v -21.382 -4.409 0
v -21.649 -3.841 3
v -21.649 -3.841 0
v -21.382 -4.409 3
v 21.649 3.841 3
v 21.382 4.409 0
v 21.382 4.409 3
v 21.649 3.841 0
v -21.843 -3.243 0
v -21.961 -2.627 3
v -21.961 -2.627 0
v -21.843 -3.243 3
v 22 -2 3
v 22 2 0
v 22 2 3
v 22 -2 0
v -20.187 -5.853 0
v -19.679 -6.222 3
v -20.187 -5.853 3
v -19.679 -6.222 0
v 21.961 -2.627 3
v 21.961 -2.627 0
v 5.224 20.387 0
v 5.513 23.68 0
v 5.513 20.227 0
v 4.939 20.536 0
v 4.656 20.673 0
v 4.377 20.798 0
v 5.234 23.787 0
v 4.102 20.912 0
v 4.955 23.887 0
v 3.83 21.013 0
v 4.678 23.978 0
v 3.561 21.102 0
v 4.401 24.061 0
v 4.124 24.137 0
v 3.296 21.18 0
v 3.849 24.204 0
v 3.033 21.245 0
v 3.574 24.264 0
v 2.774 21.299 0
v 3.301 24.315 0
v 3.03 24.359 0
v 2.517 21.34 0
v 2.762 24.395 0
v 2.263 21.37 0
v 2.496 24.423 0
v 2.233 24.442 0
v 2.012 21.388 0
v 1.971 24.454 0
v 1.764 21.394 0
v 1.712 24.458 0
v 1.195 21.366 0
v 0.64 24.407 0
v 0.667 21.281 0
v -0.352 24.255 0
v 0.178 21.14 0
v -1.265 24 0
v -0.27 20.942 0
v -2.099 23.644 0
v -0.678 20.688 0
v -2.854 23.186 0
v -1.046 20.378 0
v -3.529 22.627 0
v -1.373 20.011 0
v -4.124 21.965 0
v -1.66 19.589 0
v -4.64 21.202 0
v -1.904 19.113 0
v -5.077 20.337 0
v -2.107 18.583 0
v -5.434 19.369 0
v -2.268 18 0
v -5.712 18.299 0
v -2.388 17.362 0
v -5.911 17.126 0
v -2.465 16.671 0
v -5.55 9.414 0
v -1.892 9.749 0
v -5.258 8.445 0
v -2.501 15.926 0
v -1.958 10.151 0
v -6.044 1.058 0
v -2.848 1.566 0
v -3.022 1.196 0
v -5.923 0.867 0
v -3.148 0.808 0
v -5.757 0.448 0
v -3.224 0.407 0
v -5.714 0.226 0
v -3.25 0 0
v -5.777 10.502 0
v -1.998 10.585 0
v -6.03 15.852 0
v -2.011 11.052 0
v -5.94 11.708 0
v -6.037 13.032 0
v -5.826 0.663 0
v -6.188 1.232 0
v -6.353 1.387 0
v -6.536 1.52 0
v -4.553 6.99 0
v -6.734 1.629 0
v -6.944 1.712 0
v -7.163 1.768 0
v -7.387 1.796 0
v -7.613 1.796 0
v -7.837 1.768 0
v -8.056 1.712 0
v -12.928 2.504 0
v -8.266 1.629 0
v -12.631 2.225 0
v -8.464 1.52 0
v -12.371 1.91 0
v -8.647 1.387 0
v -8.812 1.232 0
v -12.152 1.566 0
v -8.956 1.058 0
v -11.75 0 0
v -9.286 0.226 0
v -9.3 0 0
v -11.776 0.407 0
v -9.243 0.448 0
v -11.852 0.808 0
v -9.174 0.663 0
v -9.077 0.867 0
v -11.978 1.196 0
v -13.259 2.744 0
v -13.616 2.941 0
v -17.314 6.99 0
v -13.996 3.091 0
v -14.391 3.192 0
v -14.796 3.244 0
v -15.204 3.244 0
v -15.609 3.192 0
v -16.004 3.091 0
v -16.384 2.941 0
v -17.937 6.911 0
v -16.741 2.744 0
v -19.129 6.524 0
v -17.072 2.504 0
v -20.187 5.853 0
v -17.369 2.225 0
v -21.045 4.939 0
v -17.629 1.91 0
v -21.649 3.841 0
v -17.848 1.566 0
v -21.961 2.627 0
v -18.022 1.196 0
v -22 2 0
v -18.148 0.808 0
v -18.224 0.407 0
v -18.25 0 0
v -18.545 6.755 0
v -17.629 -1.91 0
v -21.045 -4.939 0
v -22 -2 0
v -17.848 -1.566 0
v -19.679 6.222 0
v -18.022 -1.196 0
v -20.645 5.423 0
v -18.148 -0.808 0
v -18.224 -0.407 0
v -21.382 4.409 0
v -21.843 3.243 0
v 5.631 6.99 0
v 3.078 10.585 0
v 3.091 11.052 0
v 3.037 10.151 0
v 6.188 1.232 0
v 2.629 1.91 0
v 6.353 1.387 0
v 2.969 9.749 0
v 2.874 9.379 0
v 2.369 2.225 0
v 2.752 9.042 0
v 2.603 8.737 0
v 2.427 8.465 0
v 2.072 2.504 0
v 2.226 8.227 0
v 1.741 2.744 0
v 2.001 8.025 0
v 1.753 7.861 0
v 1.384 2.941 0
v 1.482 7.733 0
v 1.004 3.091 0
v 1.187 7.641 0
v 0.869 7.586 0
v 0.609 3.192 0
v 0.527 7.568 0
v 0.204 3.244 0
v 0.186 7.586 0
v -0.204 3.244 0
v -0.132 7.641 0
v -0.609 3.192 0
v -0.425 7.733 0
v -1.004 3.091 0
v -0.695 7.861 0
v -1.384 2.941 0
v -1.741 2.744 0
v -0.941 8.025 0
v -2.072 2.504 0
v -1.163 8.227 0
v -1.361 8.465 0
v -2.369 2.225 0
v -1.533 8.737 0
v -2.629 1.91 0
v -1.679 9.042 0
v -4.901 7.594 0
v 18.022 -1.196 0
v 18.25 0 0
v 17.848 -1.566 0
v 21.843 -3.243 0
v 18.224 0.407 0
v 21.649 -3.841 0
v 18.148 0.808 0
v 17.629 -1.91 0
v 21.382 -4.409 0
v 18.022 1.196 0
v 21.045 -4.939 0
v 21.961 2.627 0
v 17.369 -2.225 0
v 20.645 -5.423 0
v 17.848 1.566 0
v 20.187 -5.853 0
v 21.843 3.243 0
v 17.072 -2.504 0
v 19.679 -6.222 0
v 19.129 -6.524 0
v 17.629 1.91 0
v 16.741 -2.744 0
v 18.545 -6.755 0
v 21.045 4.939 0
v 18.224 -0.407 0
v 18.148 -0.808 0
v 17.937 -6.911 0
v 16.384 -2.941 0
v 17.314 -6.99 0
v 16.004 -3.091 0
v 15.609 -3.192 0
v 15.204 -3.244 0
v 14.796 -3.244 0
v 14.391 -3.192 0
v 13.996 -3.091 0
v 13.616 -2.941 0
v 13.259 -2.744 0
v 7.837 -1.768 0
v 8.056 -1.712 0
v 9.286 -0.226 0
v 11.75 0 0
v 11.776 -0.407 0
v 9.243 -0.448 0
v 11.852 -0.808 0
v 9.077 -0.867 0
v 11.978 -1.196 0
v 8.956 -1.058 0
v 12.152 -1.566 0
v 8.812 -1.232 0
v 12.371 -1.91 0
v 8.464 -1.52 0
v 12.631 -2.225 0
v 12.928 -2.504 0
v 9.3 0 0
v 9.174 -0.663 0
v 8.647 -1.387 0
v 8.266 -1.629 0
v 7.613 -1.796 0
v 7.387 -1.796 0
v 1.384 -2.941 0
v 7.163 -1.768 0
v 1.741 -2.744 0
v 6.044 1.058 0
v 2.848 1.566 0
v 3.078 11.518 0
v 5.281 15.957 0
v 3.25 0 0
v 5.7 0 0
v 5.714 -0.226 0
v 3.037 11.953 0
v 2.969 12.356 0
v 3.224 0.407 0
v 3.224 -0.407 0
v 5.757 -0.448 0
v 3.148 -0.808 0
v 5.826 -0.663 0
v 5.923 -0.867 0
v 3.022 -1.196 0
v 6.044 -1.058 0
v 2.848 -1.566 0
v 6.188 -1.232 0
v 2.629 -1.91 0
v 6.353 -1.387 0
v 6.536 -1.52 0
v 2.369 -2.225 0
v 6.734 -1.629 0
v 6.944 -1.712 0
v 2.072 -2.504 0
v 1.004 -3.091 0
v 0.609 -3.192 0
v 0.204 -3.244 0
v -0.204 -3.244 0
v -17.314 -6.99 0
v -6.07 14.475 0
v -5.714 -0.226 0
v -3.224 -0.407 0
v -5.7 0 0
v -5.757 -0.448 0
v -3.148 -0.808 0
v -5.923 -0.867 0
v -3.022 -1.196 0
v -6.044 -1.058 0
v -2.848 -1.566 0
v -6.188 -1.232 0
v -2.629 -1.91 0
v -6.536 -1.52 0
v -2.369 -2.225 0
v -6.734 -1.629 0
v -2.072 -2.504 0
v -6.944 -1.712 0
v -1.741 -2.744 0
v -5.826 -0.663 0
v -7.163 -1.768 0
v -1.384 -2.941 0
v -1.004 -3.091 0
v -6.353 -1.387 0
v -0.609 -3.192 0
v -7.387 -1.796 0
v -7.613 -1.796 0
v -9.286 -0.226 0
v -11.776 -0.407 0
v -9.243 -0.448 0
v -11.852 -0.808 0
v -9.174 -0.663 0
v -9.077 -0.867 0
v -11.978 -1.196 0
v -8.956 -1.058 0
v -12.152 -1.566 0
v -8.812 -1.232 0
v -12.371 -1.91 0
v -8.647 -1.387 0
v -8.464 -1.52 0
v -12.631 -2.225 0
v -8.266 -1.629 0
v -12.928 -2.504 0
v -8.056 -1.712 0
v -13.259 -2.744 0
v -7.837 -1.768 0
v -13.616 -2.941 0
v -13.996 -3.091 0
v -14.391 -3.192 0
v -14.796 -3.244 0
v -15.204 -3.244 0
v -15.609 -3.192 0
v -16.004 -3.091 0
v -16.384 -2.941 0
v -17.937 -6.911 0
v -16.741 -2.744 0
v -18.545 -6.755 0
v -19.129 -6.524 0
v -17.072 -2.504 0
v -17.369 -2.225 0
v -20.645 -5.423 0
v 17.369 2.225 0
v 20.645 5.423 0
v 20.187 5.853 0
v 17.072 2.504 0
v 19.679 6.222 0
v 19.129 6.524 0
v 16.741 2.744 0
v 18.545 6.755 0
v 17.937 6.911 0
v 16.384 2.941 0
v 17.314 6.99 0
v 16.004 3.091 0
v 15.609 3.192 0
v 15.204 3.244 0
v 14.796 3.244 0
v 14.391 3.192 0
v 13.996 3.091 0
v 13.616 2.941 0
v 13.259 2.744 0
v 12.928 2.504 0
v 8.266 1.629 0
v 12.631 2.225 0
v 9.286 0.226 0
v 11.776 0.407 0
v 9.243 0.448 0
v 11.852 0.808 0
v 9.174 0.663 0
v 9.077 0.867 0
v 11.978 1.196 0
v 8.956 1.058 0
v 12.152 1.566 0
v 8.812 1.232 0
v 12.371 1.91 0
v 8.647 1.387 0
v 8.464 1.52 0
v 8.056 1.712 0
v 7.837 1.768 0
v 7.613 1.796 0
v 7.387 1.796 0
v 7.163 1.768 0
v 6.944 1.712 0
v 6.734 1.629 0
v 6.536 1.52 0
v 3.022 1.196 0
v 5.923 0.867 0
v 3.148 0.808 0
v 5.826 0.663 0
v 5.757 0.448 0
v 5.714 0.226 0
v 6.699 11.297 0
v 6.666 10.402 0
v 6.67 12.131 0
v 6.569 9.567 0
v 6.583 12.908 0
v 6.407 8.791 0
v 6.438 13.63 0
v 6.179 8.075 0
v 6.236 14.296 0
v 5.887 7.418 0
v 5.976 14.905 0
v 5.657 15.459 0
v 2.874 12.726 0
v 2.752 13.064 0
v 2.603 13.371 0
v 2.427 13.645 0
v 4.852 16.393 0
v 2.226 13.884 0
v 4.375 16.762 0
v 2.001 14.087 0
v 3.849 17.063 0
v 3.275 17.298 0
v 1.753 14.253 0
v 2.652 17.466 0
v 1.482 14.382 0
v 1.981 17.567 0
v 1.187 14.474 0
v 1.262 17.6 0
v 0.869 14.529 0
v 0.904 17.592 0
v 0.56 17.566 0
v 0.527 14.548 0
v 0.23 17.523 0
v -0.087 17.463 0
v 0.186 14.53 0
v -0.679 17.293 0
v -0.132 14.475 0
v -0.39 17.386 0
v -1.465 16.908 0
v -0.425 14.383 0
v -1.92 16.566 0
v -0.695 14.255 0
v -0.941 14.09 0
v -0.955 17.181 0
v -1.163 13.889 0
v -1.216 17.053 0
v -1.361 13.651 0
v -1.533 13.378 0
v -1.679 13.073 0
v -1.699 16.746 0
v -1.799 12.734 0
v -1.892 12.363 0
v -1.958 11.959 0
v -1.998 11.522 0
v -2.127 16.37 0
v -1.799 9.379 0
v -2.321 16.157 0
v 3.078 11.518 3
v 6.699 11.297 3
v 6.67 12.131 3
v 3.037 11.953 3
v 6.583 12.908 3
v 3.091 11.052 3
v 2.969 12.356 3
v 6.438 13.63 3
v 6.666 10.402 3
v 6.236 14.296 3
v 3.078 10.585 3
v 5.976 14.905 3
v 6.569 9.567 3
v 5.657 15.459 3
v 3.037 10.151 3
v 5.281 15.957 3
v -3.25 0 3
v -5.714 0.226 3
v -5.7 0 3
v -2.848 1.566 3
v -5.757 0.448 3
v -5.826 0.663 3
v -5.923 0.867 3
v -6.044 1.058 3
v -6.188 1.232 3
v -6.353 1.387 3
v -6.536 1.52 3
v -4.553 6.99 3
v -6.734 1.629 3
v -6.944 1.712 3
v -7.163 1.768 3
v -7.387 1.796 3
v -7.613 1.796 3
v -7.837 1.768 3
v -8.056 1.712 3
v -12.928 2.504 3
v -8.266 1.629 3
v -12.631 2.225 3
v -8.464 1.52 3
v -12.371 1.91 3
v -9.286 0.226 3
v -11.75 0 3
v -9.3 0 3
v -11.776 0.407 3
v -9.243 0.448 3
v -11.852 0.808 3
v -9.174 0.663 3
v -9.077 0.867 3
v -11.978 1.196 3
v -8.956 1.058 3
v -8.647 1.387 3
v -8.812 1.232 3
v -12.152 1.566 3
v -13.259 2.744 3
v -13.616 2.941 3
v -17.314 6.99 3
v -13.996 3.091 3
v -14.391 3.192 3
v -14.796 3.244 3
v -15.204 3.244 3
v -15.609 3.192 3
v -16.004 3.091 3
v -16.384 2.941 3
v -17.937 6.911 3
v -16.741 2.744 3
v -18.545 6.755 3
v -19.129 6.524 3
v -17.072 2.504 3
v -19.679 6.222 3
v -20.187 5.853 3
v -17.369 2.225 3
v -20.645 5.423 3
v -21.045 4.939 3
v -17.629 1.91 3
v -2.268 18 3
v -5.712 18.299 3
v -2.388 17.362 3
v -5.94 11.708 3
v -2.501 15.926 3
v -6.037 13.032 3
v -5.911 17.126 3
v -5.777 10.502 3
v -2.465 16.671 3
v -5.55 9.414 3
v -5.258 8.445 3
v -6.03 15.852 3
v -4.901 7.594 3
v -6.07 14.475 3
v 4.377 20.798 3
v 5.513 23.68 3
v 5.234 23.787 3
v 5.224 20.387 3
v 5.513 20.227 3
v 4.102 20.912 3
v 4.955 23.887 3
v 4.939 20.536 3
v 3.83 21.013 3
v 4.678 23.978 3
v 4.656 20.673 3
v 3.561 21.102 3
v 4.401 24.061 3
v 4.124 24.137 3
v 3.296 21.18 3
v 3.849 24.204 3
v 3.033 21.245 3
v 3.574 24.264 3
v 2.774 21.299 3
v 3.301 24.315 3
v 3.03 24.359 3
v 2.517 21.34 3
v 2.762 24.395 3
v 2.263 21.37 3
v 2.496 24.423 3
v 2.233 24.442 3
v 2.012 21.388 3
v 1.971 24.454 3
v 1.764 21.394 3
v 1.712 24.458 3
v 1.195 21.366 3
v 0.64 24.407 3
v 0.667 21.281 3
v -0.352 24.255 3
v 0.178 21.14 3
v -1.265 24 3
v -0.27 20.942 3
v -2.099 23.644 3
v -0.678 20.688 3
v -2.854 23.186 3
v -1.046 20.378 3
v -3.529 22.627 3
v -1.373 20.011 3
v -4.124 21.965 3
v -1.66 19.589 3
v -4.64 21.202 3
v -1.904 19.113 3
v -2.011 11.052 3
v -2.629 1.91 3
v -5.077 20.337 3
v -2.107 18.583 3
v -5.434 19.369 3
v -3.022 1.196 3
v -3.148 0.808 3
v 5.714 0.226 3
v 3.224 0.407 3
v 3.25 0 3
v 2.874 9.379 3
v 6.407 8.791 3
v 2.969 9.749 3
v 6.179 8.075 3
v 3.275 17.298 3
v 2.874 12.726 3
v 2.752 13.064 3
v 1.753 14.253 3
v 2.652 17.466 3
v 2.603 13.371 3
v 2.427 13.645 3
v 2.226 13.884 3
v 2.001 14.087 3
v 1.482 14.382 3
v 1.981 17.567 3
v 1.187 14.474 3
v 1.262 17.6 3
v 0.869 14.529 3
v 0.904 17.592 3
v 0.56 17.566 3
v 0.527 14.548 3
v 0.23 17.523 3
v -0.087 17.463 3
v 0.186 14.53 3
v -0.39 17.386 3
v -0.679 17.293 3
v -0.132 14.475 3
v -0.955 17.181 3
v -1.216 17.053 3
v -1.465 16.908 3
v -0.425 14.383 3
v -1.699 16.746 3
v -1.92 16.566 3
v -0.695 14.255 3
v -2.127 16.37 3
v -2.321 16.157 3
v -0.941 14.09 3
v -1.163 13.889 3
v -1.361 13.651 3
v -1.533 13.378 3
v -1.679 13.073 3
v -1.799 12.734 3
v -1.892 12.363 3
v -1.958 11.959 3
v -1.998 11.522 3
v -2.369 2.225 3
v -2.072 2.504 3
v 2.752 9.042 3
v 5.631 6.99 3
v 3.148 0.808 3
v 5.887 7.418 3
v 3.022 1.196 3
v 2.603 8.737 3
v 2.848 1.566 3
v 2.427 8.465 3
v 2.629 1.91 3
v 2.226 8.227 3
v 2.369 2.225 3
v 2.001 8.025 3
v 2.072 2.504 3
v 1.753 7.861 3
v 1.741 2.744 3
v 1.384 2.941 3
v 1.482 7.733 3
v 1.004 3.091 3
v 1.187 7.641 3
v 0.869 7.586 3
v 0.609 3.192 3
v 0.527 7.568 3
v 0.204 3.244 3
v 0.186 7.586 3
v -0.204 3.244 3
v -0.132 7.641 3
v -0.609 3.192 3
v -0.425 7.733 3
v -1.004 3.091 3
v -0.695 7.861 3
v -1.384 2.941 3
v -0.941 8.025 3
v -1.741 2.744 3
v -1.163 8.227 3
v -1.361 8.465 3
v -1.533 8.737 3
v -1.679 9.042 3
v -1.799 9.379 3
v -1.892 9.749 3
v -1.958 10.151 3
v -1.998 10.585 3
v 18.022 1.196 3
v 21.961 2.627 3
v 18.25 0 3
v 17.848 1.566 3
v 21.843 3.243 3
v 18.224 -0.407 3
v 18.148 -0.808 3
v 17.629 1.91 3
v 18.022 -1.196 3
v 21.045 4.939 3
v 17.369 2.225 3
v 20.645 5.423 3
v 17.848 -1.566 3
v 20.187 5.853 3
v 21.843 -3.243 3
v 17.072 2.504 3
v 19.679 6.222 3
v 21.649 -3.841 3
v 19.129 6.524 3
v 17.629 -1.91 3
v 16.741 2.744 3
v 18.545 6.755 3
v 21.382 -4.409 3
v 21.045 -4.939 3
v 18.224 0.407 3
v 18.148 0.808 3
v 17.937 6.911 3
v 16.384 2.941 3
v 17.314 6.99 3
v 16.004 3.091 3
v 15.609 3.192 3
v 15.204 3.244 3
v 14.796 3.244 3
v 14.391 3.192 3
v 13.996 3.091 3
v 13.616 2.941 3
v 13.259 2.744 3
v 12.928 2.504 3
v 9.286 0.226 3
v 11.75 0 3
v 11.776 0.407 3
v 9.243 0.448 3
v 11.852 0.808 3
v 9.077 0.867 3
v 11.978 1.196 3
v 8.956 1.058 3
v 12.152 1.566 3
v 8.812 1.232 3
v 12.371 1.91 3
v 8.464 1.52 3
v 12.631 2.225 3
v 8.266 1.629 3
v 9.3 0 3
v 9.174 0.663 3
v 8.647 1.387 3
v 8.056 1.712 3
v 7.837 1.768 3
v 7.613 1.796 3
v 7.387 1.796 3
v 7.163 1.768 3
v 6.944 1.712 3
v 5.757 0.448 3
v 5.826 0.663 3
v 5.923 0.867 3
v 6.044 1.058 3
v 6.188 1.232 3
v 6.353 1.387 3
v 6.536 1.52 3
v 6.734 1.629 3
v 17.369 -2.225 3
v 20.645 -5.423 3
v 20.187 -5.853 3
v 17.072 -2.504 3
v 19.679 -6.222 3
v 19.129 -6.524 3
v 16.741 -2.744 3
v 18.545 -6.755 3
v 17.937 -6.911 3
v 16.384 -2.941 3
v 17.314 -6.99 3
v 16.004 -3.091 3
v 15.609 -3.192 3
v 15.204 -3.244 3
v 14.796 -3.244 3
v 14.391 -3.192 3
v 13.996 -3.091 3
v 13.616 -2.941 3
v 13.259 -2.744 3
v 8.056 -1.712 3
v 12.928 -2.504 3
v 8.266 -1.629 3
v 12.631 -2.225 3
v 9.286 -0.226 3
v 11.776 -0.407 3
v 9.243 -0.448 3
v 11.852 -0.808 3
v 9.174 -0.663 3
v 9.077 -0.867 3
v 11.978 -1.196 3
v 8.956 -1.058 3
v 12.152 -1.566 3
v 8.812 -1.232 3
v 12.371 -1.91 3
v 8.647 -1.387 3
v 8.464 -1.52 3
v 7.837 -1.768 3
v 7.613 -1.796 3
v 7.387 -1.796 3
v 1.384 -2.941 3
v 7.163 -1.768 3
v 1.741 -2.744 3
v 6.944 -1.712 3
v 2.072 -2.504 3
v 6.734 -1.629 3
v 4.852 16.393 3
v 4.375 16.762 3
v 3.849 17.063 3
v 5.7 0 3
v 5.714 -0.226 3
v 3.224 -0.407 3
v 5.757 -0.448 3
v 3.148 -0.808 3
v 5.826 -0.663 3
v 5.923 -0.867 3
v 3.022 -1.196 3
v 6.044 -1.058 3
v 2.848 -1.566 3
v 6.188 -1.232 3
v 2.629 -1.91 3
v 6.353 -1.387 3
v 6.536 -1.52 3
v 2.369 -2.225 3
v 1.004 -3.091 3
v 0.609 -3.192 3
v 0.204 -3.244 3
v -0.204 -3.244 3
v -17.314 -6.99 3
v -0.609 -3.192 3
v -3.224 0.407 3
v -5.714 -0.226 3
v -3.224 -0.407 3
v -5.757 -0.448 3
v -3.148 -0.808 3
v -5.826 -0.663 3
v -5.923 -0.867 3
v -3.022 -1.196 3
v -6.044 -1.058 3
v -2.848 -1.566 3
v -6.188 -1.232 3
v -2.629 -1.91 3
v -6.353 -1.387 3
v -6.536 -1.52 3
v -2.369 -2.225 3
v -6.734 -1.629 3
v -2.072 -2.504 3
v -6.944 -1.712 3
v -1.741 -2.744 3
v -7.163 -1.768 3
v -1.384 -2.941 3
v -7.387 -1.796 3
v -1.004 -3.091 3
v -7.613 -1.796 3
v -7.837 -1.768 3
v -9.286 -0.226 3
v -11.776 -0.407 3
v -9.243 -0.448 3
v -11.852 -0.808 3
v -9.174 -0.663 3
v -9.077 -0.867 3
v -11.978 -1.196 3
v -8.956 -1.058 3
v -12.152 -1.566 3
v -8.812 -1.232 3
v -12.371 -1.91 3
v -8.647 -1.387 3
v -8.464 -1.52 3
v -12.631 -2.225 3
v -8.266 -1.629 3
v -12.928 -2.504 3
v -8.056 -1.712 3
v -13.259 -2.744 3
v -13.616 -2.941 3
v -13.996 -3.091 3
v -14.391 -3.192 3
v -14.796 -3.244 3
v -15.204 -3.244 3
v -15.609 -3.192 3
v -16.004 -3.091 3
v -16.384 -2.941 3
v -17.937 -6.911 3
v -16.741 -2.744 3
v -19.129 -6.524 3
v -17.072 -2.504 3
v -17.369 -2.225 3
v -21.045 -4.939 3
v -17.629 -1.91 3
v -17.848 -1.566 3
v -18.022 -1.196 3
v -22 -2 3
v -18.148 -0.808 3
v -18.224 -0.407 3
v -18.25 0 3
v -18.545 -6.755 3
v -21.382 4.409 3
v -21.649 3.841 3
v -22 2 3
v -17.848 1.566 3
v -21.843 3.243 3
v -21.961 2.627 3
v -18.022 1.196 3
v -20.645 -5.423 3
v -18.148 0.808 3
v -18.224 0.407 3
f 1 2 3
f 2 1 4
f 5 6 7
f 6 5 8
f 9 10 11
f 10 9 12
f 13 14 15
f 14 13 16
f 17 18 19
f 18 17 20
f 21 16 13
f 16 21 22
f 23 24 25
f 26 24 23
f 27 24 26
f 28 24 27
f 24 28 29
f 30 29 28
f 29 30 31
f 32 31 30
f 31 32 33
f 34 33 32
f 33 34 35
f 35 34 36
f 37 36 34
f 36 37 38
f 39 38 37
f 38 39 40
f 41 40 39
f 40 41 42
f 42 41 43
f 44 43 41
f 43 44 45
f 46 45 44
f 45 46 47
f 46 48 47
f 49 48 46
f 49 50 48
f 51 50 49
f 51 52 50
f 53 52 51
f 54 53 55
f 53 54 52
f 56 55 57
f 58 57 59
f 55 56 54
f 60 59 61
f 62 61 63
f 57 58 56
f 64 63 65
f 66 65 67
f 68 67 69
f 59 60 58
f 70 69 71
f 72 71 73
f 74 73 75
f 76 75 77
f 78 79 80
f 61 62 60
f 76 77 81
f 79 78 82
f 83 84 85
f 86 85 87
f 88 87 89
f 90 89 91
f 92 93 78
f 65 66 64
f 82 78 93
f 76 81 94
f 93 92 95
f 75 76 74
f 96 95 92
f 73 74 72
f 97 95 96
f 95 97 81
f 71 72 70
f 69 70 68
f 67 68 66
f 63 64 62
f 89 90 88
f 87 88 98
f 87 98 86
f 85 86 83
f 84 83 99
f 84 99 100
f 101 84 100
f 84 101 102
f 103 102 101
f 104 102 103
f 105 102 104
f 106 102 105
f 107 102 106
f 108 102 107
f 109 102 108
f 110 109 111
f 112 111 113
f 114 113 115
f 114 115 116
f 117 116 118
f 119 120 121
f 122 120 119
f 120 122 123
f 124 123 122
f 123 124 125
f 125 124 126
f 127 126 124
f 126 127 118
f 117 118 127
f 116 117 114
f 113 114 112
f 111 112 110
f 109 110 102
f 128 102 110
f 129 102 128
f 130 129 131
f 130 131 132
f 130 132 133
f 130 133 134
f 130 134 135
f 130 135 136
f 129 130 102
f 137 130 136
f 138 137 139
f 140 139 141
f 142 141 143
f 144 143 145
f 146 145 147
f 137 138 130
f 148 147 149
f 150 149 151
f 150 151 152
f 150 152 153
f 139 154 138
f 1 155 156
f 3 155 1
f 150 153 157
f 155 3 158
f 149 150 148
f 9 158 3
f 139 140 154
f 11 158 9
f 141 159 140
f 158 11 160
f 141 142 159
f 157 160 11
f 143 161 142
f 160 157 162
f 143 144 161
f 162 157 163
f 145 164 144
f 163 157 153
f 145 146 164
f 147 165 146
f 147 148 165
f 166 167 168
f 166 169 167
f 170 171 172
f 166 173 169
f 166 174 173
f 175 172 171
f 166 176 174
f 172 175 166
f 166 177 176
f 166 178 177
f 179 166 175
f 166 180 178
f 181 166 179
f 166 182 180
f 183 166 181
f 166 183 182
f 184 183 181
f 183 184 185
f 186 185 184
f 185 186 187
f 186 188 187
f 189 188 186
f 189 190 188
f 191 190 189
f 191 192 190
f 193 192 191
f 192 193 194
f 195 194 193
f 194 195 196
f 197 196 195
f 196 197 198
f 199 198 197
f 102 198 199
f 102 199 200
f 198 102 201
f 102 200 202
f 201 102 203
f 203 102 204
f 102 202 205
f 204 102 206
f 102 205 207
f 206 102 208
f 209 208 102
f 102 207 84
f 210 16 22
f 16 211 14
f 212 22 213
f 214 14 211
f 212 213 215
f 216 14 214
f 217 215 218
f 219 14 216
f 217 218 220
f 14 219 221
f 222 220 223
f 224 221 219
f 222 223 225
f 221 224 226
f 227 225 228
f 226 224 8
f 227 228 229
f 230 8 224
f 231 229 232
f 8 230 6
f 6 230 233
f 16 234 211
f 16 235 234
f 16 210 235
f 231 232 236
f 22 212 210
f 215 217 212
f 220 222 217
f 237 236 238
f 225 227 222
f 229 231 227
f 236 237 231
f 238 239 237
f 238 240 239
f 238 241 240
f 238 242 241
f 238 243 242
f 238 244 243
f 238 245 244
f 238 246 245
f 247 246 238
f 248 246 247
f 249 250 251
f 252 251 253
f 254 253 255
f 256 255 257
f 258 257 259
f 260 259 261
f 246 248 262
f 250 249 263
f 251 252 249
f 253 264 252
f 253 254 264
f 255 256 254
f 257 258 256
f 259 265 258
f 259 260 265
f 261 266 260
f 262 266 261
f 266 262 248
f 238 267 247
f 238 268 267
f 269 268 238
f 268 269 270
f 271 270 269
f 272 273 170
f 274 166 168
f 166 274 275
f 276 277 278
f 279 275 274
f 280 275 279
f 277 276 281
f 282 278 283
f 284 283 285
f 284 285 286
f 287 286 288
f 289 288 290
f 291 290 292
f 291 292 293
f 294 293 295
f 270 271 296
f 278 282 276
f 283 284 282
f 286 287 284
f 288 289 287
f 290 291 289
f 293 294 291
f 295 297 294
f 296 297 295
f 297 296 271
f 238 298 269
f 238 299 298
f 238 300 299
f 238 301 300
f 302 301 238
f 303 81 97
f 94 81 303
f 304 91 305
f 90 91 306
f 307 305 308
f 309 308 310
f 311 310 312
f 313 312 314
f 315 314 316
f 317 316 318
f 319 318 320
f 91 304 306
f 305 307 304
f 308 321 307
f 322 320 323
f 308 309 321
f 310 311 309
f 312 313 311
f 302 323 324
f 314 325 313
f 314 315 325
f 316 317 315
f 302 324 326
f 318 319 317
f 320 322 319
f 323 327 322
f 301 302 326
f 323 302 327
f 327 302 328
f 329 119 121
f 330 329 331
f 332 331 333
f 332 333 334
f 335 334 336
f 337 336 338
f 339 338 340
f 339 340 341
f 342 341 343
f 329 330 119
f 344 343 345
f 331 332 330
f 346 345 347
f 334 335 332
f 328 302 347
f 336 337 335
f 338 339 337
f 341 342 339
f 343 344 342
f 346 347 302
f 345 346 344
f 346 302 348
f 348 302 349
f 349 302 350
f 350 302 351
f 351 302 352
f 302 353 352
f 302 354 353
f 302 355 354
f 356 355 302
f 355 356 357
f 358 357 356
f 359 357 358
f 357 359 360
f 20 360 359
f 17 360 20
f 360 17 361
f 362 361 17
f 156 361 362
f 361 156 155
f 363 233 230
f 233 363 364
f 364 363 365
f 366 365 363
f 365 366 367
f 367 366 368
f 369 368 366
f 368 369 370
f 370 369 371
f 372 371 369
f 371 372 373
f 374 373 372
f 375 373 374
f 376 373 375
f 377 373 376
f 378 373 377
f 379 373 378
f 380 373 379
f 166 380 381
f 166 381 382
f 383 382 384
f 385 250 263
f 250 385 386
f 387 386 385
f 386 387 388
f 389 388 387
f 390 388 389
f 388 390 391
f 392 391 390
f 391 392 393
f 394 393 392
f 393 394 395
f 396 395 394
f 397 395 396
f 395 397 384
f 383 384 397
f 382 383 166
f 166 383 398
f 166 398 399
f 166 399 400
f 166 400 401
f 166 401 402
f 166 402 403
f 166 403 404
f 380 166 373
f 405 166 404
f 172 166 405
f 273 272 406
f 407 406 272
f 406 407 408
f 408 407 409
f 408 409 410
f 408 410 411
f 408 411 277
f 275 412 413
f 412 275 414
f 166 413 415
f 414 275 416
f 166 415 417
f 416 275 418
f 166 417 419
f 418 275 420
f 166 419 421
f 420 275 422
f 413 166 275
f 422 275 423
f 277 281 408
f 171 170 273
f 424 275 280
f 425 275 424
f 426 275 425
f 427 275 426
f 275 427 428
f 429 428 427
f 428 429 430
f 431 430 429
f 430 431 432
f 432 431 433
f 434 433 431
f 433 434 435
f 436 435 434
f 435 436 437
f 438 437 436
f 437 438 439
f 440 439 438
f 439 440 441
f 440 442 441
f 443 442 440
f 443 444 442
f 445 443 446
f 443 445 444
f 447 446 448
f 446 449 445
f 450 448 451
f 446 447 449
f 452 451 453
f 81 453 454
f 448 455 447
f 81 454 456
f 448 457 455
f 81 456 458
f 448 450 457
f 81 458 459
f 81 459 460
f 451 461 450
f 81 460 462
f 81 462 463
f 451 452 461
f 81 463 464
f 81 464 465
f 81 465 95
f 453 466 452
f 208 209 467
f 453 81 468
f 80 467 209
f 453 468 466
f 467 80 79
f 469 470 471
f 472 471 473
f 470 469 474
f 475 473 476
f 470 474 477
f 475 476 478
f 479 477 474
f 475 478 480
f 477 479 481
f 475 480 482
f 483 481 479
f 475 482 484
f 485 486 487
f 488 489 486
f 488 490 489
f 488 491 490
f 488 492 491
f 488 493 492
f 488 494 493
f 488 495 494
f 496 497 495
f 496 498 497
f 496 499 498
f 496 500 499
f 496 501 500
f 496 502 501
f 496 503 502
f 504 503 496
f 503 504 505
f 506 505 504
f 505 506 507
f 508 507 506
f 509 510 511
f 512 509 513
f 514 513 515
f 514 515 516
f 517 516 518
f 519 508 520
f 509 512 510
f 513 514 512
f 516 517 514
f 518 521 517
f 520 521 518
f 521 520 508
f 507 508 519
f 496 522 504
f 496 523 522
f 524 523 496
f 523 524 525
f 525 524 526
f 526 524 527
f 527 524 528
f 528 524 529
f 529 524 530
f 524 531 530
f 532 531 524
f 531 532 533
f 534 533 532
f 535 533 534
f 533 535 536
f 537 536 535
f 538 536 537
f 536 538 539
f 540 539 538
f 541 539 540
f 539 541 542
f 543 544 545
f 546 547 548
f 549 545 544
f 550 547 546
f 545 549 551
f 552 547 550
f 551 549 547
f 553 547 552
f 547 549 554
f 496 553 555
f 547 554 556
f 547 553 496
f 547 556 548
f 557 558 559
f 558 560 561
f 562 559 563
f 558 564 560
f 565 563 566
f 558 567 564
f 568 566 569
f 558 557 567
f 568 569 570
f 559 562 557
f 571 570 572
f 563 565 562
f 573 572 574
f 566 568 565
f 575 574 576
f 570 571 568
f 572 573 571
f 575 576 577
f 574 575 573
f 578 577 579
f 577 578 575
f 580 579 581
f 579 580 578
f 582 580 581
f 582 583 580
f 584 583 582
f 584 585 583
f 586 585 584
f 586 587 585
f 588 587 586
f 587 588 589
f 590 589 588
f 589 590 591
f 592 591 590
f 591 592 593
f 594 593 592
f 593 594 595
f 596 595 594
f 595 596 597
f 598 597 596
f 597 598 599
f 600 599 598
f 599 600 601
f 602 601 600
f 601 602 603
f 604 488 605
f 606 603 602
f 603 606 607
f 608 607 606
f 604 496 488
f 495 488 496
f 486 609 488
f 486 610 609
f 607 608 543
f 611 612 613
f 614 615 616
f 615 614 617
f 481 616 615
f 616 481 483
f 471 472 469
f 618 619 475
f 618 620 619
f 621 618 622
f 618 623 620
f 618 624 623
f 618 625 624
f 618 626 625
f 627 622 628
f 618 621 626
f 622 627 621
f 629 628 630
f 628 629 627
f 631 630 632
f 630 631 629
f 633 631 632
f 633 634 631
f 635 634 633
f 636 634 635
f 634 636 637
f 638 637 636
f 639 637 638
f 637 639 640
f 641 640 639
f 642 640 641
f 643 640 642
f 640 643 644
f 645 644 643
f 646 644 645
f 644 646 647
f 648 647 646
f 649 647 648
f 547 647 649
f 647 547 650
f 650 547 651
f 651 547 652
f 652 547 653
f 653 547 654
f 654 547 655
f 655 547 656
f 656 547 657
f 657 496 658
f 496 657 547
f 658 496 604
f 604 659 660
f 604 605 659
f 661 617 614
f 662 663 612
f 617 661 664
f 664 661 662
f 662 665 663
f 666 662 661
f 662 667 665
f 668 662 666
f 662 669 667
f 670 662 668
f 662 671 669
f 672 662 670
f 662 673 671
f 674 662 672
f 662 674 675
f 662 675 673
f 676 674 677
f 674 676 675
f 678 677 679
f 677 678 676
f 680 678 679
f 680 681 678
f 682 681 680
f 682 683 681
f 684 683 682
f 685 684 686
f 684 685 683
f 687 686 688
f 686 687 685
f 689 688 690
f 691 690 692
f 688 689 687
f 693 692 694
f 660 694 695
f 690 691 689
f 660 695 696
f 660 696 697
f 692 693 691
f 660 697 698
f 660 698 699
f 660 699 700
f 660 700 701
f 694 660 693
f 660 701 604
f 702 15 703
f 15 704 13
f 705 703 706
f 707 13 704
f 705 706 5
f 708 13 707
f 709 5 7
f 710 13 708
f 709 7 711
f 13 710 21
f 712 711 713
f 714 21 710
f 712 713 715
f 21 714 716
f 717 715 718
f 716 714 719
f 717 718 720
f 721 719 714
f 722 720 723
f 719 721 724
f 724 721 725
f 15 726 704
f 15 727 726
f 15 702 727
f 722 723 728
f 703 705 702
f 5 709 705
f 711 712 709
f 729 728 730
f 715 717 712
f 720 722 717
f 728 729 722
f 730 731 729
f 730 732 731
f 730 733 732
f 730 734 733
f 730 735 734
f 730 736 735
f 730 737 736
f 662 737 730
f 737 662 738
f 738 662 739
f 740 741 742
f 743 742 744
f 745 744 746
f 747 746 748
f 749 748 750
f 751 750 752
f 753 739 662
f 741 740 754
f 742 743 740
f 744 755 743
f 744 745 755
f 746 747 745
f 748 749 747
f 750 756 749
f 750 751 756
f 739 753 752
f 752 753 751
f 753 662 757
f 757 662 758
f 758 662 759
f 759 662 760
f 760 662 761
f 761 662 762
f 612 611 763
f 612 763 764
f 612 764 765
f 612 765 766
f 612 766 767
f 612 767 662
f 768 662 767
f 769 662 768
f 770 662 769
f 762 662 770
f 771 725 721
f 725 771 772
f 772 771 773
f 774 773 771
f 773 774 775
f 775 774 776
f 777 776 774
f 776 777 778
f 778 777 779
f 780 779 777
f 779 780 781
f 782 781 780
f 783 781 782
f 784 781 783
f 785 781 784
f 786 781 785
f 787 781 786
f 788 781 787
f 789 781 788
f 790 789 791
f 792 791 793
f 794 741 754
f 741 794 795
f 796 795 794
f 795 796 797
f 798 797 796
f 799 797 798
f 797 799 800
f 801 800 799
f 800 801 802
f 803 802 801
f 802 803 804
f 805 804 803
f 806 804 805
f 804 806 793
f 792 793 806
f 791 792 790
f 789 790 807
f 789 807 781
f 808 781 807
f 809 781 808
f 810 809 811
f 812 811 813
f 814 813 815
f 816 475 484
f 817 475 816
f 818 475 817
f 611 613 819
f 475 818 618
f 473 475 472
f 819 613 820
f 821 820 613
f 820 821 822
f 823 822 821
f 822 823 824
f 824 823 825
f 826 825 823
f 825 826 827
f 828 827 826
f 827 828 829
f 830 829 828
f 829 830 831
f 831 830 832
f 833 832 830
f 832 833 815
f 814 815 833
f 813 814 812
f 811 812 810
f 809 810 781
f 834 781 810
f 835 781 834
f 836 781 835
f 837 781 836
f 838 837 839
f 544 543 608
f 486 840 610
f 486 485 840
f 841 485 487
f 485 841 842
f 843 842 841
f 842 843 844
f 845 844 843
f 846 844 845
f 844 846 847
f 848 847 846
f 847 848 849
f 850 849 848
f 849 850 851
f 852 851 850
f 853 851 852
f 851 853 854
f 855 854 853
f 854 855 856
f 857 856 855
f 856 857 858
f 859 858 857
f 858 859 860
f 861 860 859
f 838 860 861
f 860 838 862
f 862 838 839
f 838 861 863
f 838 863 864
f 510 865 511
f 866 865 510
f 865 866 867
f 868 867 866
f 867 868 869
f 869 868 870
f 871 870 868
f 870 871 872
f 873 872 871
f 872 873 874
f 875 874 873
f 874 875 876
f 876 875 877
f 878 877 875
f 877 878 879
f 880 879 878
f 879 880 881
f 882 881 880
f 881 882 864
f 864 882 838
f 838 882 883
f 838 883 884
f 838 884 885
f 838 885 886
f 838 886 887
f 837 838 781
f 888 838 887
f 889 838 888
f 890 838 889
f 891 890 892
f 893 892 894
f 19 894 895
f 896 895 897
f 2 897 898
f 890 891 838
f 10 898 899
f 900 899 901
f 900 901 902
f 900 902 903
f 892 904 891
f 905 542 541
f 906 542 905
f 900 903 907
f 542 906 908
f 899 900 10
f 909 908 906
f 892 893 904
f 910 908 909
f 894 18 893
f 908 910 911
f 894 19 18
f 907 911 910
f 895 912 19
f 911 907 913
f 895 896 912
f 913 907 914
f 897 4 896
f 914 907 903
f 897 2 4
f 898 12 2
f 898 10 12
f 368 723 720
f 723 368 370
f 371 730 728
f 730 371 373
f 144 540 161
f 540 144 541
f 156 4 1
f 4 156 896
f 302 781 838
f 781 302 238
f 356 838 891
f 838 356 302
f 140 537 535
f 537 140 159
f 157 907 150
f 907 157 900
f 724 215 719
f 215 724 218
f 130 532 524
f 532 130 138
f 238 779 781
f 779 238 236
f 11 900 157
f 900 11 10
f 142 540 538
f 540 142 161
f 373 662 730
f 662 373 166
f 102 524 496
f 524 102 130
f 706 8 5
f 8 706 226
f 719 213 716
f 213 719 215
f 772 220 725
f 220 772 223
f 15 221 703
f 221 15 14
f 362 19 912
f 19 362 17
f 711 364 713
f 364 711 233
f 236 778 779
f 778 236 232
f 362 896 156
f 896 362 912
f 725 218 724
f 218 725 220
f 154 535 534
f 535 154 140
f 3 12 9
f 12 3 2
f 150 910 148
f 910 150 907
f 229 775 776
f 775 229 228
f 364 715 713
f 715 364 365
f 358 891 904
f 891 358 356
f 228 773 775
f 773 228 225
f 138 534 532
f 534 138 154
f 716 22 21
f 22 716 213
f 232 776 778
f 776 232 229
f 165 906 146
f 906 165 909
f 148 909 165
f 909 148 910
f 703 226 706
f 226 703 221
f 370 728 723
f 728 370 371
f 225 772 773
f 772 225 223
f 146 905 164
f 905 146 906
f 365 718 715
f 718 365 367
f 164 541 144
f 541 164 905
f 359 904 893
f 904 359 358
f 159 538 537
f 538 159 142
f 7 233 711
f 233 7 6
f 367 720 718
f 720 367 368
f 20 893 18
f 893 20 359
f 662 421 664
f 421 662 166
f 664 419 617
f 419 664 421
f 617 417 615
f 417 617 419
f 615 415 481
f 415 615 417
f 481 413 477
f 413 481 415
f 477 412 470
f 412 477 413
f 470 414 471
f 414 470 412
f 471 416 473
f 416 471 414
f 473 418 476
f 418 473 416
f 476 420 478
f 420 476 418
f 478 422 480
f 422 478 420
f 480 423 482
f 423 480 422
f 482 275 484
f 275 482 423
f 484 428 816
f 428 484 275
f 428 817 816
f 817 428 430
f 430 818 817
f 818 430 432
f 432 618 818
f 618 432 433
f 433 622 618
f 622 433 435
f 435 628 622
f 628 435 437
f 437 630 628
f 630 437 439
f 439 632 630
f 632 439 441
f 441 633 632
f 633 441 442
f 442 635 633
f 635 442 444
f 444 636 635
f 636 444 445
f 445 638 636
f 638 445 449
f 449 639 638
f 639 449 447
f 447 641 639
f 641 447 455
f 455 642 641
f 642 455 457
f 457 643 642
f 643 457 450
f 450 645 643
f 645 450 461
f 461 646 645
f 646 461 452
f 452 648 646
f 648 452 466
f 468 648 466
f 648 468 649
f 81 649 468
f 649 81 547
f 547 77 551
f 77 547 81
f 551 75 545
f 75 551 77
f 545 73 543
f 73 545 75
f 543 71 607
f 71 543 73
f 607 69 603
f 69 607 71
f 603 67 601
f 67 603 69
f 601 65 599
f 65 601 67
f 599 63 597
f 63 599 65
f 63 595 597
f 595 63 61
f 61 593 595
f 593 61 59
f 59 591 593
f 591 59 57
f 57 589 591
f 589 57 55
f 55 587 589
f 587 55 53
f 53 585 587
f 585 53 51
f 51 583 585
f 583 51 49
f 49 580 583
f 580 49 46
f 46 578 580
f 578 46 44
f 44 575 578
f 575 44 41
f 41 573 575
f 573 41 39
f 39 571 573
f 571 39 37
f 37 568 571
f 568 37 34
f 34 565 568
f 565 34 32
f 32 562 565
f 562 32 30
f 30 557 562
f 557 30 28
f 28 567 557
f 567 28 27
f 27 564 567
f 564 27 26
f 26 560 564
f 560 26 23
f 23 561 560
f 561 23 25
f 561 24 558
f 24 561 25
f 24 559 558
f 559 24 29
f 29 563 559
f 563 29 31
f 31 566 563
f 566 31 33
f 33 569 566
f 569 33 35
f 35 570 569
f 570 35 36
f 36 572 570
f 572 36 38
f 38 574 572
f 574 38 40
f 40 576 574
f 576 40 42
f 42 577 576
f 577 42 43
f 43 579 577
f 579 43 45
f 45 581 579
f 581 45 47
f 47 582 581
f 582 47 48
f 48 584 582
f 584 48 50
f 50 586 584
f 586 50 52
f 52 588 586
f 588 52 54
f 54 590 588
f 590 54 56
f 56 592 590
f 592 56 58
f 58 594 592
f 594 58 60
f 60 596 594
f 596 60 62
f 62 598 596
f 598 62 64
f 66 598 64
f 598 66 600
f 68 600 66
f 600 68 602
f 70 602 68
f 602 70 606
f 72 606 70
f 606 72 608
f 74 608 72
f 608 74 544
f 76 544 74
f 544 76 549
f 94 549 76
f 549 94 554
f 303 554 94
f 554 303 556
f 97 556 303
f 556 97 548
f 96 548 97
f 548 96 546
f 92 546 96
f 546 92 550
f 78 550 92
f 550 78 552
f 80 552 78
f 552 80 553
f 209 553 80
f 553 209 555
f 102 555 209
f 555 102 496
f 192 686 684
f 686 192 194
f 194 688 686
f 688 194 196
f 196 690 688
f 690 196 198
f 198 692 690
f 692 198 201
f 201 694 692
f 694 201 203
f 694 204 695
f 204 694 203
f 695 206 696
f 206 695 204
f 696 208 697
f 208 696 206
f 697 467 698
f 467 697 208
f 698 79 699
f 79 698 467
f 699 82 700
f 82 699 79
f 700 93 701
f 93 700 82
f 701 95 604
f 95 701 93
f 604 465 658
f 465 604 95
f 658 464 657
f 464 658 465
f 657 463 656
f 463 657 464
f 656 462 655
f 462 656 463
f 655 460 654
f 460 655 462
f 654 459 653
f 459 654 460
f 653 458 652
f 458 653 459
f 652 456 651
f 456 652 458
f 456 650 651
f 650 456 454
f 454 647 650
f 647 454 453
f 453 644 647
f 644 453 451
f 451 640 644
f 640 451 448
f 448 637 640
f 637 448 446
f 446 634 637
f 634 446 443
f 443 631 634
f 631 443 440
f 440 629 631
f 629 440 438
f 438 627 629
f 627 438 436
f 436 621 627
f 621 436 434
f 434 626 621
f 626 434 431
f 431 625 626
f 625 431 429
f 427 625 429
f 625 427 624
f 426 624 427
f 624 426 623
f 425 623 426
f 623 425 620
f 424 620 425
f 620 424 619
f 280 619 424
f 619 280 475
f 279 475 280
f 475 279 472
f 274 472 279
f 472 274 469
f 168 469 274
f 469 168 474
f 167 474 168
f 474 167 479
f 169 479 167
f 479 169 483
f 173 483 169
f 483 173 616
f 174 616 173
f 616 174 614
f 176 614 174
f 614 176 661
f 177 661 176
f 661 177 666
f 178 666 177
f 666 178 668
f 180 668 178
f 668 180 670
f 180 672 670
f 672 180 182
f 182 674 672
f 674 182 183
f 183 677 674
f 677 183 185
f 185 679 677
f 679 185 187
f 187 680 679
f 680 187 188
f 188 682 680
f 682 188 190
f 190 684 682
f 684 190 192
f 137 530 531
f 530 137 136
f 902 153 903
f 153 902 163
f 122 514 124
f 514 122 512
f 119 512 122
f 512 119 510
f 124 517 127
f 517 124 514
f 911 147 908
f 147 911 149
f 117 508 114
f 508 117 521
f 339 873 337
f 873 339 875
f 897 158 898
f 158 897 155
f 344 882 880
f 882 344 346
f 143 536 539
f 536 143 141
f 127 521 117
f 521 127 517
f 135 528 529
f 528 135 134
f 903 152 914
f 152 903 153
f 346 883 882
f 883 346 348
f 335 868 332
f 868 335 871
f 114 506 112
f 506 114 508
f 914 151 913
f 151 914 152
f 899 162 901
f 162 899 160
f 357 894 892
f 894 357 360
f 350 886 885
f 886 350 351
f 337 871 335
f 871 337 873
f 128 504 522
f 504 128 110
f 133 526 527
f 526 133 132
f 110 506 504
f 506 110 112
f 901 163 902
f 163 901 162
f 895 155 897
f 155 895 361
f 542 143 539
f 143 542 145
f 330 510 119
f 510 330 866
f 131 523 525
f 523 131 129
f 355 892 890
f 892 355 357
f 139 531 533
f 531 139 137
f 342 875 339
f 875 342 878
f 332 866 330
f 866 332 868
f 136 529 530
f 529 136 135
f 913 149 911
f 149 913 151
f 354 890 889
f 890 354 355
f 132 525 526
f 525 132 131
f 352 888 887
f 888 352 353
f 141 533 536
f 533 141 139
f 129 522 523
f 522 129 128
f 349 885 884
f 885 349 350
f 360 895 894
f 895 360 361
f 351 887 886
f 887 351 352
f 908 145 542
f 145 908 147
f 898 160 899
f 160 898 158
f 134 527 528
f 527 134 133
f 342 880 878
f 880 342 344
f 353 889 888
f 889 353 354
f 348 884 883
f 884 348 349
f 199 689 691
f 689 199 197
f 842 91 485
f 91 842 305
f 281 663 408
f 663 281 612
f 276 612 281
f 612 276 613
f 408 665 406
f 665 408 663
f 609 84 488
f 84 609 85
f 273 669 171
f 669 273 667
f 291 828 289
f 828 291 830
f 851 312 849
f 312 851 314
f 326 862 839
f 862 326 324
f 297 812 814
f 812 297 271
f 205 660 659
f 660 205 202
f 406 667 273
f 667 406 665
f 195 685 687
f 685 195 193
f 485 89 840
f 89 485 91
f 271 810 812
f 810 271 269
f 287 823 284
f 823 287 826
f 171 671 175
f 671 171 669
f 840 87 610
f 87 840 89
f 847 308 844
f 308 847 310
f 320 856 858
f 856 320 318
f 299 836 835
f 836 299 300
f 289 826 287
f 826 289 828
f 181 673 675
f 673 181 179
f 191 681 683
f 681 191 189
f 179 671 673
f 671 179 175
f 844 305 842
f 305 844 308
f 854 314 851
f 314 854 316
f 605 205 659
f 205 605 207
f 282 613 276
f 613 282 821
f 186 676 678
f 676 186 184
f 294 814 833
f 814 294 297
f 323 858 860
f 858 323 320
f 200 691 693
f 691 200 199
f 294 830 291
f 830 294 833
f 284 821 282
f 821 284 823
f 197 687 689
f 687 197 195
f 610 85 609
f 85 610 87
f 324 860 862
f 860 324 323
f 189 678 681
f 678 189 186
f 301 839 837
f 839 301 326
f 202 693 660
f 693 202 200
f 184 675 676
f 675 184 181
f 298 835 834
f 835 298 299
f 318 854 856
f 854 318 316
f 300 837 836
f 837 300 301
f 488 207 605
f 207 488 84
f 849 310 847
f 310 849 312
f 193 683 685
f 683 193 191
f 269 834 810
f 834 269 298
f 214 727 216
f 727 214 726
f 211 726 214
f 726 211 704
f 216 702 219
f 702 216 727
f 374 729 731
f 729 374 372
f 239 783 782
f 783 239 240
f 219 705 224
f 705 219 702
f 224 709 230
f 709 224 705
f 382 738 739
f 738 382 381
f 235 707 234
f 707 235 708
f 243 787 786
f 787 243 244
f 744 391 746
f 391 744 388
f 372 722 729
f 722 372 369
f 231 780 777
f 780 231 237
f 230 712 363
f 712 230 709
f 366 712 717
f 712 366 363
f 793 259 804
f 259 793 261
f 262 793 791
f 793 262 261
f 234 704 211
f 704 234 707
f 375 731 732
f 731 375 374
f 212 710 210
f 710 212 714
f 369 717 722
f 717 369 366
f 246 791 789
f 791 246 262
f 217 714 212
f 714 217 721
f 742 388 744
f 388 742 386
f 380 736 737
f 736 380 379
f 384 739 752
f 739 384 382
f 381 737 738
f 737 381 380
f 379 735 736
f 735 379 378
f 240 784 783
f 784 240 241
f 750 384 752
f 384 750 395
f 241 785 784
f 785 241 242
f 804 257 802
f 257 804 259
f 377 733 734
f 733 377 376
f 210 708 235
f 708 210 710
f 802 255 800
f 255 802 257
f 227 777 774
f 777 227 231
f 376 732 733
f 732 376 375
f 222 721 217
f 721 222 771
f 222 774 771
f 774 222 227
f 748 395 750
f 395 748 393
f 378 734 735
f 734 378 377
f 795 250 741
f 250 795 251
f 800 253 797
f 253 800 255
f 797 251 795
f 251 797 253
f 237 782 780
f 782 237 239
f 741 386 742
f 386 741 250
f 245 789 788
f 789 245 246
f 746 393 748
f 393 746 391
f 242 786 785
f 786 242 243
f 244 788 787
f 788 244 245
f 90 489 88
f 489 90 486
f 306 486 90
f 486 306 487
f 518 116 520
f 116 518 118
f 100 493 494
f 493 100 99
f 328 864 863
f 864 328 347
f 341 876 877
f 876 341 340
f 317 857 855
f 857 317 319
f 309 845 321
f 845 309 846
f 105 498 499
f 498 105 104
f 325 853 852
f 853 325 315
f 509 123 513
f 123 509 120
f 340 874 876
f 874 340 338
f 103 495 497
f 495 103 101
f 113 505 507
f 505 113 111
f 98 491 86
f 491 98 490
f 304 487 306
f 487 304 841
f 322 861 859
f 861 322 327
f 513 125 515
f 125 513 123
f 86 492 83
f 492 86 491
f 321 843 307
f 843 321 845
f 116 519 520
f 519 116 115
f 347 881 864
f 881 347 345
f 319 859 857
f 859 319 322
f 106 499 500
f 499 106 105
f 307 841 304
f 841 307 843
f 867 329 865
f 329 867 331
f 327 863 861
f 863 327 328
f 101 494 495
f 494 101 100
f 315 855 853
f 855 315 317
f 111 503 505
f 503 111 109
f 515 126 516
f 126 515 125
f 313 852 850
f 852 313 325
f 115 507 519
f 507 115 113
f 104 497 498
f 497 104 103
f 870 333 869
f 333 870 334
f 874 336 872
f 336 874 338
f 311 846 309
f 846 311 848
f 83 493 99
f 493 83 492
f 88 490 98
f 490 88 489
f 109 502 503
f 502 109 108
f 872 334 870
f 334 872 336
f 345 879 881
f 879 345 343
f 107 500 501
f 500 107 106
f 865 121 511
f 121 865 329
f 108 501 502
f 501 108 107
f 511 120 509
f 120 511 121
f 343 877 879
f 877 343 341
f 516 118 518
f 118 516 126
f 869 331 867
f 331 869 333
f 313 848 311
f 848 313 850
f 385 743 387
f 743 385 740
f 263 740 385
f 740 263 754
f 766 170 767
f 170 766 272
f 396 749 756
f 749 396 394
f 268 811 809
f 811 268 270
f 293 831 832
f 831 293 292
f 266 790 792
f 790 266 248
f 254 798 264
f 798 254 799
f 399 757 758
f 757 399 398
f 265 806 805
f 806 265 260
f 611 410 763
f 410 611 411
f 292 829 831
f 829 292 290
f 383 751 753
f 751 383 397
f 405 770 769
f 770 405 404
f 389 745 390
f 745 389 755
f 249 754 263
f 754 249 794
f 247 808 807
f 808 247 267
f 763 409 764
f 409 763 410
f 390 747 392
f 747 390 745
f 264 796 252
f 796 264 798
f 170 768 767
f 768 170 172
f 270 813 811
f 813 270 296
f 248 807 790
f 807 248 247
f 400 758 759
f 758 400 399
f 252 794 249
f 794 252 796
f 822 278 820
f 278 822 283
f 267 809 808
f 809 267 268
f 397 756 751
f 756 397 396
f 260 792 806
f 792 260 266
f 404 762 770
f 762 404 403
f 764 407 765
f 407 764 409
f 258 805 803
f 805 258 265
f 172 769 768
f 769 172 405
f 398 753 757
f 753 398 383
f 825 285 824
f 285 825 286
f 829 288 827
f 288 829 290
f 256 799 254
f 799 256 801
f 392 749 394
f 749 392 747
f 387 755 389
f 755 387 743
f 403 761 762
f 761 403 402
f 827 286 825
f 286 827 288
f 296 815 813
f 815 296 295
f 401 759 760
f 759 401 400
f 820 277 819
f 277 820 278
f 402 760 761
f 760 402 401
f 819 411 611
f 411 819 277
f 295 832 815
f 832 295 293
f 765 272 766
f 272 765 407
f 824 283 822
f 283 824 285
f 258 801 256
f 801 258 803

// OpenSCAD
$fn = 50;


difference() {
	union() {
		hull() {
			translate(v = [-17.0000000000, 2.0000000000, 0]) {
				cylinder(h = 3, r = 5);
			}
			translate(v = [17.0000000000, 2.0000000000, 0]) {
				cylinder(h = 3, r = 5);
			}
			translate(v = [-17.0000000000, -2.0000000000, 0]) {
				cylinder(h = 3, r = 5);
			}
			translate(v = [17.0000000000, -2.0000000000, 0]) {
				cylinder(h = 3, r = 5);
			}
		}
		translate(v = [0, 24, 0]) {
			linear_extrude(height = 3) {
				text(font = "DejaVu Sans Mono:style=Bold", halign = "center", size = 19.0000000000, text = "6", valign = "top");
			}
		}
	}
	union() {
		translate(v = [-15.0000000000, 0.0000000000, 0]) {
			translate(v = [0, 0, -100]) {
				cylinder(h = 200, r = 3.2500000000);
			}
		}
		translate(v = [0, 0, -100]) {
			cylinder(h = 200, r = 3.2500000000);
		}
		translate(v = [15.0000000000, 0.0000000000, 0]) {
			translate(v = [0, 0, -100]) {
				cylinder(h = 200, r = 3.2500000000);
			}
		}
		translate(v = [-15.0000000000, 0.0000000000, 0]) {
			translate(v = [0, 0, -100]) {
				cylinder(h = 200, r = 1.8000000000);
			}
		}
		translate(v = [-7.5000000000, 0.0000000000, 0]) {
			translate(v = [0, 0, -100]) {
				cylinder(h = 200, r = 1.8000000000);
			}
		}
		translate(v = [0, 0, -100]) {
			cylinder(h = 200, r = 1.8000000000);
		}
		translate(v = [7.5000000000, 0.0000000000, 0]) {
			translate(v = [0, 0, -100]) {
				cylinder(h = 200, r = 1.8000000000);
			}
		}
		translate(v = [15.0000000000, 0.0000000000, 0]) {
			translate(v = [0, 0, -100]) {
				cylinder(h = 200, r = 1.8000000000);
			}
		}
	}
}
